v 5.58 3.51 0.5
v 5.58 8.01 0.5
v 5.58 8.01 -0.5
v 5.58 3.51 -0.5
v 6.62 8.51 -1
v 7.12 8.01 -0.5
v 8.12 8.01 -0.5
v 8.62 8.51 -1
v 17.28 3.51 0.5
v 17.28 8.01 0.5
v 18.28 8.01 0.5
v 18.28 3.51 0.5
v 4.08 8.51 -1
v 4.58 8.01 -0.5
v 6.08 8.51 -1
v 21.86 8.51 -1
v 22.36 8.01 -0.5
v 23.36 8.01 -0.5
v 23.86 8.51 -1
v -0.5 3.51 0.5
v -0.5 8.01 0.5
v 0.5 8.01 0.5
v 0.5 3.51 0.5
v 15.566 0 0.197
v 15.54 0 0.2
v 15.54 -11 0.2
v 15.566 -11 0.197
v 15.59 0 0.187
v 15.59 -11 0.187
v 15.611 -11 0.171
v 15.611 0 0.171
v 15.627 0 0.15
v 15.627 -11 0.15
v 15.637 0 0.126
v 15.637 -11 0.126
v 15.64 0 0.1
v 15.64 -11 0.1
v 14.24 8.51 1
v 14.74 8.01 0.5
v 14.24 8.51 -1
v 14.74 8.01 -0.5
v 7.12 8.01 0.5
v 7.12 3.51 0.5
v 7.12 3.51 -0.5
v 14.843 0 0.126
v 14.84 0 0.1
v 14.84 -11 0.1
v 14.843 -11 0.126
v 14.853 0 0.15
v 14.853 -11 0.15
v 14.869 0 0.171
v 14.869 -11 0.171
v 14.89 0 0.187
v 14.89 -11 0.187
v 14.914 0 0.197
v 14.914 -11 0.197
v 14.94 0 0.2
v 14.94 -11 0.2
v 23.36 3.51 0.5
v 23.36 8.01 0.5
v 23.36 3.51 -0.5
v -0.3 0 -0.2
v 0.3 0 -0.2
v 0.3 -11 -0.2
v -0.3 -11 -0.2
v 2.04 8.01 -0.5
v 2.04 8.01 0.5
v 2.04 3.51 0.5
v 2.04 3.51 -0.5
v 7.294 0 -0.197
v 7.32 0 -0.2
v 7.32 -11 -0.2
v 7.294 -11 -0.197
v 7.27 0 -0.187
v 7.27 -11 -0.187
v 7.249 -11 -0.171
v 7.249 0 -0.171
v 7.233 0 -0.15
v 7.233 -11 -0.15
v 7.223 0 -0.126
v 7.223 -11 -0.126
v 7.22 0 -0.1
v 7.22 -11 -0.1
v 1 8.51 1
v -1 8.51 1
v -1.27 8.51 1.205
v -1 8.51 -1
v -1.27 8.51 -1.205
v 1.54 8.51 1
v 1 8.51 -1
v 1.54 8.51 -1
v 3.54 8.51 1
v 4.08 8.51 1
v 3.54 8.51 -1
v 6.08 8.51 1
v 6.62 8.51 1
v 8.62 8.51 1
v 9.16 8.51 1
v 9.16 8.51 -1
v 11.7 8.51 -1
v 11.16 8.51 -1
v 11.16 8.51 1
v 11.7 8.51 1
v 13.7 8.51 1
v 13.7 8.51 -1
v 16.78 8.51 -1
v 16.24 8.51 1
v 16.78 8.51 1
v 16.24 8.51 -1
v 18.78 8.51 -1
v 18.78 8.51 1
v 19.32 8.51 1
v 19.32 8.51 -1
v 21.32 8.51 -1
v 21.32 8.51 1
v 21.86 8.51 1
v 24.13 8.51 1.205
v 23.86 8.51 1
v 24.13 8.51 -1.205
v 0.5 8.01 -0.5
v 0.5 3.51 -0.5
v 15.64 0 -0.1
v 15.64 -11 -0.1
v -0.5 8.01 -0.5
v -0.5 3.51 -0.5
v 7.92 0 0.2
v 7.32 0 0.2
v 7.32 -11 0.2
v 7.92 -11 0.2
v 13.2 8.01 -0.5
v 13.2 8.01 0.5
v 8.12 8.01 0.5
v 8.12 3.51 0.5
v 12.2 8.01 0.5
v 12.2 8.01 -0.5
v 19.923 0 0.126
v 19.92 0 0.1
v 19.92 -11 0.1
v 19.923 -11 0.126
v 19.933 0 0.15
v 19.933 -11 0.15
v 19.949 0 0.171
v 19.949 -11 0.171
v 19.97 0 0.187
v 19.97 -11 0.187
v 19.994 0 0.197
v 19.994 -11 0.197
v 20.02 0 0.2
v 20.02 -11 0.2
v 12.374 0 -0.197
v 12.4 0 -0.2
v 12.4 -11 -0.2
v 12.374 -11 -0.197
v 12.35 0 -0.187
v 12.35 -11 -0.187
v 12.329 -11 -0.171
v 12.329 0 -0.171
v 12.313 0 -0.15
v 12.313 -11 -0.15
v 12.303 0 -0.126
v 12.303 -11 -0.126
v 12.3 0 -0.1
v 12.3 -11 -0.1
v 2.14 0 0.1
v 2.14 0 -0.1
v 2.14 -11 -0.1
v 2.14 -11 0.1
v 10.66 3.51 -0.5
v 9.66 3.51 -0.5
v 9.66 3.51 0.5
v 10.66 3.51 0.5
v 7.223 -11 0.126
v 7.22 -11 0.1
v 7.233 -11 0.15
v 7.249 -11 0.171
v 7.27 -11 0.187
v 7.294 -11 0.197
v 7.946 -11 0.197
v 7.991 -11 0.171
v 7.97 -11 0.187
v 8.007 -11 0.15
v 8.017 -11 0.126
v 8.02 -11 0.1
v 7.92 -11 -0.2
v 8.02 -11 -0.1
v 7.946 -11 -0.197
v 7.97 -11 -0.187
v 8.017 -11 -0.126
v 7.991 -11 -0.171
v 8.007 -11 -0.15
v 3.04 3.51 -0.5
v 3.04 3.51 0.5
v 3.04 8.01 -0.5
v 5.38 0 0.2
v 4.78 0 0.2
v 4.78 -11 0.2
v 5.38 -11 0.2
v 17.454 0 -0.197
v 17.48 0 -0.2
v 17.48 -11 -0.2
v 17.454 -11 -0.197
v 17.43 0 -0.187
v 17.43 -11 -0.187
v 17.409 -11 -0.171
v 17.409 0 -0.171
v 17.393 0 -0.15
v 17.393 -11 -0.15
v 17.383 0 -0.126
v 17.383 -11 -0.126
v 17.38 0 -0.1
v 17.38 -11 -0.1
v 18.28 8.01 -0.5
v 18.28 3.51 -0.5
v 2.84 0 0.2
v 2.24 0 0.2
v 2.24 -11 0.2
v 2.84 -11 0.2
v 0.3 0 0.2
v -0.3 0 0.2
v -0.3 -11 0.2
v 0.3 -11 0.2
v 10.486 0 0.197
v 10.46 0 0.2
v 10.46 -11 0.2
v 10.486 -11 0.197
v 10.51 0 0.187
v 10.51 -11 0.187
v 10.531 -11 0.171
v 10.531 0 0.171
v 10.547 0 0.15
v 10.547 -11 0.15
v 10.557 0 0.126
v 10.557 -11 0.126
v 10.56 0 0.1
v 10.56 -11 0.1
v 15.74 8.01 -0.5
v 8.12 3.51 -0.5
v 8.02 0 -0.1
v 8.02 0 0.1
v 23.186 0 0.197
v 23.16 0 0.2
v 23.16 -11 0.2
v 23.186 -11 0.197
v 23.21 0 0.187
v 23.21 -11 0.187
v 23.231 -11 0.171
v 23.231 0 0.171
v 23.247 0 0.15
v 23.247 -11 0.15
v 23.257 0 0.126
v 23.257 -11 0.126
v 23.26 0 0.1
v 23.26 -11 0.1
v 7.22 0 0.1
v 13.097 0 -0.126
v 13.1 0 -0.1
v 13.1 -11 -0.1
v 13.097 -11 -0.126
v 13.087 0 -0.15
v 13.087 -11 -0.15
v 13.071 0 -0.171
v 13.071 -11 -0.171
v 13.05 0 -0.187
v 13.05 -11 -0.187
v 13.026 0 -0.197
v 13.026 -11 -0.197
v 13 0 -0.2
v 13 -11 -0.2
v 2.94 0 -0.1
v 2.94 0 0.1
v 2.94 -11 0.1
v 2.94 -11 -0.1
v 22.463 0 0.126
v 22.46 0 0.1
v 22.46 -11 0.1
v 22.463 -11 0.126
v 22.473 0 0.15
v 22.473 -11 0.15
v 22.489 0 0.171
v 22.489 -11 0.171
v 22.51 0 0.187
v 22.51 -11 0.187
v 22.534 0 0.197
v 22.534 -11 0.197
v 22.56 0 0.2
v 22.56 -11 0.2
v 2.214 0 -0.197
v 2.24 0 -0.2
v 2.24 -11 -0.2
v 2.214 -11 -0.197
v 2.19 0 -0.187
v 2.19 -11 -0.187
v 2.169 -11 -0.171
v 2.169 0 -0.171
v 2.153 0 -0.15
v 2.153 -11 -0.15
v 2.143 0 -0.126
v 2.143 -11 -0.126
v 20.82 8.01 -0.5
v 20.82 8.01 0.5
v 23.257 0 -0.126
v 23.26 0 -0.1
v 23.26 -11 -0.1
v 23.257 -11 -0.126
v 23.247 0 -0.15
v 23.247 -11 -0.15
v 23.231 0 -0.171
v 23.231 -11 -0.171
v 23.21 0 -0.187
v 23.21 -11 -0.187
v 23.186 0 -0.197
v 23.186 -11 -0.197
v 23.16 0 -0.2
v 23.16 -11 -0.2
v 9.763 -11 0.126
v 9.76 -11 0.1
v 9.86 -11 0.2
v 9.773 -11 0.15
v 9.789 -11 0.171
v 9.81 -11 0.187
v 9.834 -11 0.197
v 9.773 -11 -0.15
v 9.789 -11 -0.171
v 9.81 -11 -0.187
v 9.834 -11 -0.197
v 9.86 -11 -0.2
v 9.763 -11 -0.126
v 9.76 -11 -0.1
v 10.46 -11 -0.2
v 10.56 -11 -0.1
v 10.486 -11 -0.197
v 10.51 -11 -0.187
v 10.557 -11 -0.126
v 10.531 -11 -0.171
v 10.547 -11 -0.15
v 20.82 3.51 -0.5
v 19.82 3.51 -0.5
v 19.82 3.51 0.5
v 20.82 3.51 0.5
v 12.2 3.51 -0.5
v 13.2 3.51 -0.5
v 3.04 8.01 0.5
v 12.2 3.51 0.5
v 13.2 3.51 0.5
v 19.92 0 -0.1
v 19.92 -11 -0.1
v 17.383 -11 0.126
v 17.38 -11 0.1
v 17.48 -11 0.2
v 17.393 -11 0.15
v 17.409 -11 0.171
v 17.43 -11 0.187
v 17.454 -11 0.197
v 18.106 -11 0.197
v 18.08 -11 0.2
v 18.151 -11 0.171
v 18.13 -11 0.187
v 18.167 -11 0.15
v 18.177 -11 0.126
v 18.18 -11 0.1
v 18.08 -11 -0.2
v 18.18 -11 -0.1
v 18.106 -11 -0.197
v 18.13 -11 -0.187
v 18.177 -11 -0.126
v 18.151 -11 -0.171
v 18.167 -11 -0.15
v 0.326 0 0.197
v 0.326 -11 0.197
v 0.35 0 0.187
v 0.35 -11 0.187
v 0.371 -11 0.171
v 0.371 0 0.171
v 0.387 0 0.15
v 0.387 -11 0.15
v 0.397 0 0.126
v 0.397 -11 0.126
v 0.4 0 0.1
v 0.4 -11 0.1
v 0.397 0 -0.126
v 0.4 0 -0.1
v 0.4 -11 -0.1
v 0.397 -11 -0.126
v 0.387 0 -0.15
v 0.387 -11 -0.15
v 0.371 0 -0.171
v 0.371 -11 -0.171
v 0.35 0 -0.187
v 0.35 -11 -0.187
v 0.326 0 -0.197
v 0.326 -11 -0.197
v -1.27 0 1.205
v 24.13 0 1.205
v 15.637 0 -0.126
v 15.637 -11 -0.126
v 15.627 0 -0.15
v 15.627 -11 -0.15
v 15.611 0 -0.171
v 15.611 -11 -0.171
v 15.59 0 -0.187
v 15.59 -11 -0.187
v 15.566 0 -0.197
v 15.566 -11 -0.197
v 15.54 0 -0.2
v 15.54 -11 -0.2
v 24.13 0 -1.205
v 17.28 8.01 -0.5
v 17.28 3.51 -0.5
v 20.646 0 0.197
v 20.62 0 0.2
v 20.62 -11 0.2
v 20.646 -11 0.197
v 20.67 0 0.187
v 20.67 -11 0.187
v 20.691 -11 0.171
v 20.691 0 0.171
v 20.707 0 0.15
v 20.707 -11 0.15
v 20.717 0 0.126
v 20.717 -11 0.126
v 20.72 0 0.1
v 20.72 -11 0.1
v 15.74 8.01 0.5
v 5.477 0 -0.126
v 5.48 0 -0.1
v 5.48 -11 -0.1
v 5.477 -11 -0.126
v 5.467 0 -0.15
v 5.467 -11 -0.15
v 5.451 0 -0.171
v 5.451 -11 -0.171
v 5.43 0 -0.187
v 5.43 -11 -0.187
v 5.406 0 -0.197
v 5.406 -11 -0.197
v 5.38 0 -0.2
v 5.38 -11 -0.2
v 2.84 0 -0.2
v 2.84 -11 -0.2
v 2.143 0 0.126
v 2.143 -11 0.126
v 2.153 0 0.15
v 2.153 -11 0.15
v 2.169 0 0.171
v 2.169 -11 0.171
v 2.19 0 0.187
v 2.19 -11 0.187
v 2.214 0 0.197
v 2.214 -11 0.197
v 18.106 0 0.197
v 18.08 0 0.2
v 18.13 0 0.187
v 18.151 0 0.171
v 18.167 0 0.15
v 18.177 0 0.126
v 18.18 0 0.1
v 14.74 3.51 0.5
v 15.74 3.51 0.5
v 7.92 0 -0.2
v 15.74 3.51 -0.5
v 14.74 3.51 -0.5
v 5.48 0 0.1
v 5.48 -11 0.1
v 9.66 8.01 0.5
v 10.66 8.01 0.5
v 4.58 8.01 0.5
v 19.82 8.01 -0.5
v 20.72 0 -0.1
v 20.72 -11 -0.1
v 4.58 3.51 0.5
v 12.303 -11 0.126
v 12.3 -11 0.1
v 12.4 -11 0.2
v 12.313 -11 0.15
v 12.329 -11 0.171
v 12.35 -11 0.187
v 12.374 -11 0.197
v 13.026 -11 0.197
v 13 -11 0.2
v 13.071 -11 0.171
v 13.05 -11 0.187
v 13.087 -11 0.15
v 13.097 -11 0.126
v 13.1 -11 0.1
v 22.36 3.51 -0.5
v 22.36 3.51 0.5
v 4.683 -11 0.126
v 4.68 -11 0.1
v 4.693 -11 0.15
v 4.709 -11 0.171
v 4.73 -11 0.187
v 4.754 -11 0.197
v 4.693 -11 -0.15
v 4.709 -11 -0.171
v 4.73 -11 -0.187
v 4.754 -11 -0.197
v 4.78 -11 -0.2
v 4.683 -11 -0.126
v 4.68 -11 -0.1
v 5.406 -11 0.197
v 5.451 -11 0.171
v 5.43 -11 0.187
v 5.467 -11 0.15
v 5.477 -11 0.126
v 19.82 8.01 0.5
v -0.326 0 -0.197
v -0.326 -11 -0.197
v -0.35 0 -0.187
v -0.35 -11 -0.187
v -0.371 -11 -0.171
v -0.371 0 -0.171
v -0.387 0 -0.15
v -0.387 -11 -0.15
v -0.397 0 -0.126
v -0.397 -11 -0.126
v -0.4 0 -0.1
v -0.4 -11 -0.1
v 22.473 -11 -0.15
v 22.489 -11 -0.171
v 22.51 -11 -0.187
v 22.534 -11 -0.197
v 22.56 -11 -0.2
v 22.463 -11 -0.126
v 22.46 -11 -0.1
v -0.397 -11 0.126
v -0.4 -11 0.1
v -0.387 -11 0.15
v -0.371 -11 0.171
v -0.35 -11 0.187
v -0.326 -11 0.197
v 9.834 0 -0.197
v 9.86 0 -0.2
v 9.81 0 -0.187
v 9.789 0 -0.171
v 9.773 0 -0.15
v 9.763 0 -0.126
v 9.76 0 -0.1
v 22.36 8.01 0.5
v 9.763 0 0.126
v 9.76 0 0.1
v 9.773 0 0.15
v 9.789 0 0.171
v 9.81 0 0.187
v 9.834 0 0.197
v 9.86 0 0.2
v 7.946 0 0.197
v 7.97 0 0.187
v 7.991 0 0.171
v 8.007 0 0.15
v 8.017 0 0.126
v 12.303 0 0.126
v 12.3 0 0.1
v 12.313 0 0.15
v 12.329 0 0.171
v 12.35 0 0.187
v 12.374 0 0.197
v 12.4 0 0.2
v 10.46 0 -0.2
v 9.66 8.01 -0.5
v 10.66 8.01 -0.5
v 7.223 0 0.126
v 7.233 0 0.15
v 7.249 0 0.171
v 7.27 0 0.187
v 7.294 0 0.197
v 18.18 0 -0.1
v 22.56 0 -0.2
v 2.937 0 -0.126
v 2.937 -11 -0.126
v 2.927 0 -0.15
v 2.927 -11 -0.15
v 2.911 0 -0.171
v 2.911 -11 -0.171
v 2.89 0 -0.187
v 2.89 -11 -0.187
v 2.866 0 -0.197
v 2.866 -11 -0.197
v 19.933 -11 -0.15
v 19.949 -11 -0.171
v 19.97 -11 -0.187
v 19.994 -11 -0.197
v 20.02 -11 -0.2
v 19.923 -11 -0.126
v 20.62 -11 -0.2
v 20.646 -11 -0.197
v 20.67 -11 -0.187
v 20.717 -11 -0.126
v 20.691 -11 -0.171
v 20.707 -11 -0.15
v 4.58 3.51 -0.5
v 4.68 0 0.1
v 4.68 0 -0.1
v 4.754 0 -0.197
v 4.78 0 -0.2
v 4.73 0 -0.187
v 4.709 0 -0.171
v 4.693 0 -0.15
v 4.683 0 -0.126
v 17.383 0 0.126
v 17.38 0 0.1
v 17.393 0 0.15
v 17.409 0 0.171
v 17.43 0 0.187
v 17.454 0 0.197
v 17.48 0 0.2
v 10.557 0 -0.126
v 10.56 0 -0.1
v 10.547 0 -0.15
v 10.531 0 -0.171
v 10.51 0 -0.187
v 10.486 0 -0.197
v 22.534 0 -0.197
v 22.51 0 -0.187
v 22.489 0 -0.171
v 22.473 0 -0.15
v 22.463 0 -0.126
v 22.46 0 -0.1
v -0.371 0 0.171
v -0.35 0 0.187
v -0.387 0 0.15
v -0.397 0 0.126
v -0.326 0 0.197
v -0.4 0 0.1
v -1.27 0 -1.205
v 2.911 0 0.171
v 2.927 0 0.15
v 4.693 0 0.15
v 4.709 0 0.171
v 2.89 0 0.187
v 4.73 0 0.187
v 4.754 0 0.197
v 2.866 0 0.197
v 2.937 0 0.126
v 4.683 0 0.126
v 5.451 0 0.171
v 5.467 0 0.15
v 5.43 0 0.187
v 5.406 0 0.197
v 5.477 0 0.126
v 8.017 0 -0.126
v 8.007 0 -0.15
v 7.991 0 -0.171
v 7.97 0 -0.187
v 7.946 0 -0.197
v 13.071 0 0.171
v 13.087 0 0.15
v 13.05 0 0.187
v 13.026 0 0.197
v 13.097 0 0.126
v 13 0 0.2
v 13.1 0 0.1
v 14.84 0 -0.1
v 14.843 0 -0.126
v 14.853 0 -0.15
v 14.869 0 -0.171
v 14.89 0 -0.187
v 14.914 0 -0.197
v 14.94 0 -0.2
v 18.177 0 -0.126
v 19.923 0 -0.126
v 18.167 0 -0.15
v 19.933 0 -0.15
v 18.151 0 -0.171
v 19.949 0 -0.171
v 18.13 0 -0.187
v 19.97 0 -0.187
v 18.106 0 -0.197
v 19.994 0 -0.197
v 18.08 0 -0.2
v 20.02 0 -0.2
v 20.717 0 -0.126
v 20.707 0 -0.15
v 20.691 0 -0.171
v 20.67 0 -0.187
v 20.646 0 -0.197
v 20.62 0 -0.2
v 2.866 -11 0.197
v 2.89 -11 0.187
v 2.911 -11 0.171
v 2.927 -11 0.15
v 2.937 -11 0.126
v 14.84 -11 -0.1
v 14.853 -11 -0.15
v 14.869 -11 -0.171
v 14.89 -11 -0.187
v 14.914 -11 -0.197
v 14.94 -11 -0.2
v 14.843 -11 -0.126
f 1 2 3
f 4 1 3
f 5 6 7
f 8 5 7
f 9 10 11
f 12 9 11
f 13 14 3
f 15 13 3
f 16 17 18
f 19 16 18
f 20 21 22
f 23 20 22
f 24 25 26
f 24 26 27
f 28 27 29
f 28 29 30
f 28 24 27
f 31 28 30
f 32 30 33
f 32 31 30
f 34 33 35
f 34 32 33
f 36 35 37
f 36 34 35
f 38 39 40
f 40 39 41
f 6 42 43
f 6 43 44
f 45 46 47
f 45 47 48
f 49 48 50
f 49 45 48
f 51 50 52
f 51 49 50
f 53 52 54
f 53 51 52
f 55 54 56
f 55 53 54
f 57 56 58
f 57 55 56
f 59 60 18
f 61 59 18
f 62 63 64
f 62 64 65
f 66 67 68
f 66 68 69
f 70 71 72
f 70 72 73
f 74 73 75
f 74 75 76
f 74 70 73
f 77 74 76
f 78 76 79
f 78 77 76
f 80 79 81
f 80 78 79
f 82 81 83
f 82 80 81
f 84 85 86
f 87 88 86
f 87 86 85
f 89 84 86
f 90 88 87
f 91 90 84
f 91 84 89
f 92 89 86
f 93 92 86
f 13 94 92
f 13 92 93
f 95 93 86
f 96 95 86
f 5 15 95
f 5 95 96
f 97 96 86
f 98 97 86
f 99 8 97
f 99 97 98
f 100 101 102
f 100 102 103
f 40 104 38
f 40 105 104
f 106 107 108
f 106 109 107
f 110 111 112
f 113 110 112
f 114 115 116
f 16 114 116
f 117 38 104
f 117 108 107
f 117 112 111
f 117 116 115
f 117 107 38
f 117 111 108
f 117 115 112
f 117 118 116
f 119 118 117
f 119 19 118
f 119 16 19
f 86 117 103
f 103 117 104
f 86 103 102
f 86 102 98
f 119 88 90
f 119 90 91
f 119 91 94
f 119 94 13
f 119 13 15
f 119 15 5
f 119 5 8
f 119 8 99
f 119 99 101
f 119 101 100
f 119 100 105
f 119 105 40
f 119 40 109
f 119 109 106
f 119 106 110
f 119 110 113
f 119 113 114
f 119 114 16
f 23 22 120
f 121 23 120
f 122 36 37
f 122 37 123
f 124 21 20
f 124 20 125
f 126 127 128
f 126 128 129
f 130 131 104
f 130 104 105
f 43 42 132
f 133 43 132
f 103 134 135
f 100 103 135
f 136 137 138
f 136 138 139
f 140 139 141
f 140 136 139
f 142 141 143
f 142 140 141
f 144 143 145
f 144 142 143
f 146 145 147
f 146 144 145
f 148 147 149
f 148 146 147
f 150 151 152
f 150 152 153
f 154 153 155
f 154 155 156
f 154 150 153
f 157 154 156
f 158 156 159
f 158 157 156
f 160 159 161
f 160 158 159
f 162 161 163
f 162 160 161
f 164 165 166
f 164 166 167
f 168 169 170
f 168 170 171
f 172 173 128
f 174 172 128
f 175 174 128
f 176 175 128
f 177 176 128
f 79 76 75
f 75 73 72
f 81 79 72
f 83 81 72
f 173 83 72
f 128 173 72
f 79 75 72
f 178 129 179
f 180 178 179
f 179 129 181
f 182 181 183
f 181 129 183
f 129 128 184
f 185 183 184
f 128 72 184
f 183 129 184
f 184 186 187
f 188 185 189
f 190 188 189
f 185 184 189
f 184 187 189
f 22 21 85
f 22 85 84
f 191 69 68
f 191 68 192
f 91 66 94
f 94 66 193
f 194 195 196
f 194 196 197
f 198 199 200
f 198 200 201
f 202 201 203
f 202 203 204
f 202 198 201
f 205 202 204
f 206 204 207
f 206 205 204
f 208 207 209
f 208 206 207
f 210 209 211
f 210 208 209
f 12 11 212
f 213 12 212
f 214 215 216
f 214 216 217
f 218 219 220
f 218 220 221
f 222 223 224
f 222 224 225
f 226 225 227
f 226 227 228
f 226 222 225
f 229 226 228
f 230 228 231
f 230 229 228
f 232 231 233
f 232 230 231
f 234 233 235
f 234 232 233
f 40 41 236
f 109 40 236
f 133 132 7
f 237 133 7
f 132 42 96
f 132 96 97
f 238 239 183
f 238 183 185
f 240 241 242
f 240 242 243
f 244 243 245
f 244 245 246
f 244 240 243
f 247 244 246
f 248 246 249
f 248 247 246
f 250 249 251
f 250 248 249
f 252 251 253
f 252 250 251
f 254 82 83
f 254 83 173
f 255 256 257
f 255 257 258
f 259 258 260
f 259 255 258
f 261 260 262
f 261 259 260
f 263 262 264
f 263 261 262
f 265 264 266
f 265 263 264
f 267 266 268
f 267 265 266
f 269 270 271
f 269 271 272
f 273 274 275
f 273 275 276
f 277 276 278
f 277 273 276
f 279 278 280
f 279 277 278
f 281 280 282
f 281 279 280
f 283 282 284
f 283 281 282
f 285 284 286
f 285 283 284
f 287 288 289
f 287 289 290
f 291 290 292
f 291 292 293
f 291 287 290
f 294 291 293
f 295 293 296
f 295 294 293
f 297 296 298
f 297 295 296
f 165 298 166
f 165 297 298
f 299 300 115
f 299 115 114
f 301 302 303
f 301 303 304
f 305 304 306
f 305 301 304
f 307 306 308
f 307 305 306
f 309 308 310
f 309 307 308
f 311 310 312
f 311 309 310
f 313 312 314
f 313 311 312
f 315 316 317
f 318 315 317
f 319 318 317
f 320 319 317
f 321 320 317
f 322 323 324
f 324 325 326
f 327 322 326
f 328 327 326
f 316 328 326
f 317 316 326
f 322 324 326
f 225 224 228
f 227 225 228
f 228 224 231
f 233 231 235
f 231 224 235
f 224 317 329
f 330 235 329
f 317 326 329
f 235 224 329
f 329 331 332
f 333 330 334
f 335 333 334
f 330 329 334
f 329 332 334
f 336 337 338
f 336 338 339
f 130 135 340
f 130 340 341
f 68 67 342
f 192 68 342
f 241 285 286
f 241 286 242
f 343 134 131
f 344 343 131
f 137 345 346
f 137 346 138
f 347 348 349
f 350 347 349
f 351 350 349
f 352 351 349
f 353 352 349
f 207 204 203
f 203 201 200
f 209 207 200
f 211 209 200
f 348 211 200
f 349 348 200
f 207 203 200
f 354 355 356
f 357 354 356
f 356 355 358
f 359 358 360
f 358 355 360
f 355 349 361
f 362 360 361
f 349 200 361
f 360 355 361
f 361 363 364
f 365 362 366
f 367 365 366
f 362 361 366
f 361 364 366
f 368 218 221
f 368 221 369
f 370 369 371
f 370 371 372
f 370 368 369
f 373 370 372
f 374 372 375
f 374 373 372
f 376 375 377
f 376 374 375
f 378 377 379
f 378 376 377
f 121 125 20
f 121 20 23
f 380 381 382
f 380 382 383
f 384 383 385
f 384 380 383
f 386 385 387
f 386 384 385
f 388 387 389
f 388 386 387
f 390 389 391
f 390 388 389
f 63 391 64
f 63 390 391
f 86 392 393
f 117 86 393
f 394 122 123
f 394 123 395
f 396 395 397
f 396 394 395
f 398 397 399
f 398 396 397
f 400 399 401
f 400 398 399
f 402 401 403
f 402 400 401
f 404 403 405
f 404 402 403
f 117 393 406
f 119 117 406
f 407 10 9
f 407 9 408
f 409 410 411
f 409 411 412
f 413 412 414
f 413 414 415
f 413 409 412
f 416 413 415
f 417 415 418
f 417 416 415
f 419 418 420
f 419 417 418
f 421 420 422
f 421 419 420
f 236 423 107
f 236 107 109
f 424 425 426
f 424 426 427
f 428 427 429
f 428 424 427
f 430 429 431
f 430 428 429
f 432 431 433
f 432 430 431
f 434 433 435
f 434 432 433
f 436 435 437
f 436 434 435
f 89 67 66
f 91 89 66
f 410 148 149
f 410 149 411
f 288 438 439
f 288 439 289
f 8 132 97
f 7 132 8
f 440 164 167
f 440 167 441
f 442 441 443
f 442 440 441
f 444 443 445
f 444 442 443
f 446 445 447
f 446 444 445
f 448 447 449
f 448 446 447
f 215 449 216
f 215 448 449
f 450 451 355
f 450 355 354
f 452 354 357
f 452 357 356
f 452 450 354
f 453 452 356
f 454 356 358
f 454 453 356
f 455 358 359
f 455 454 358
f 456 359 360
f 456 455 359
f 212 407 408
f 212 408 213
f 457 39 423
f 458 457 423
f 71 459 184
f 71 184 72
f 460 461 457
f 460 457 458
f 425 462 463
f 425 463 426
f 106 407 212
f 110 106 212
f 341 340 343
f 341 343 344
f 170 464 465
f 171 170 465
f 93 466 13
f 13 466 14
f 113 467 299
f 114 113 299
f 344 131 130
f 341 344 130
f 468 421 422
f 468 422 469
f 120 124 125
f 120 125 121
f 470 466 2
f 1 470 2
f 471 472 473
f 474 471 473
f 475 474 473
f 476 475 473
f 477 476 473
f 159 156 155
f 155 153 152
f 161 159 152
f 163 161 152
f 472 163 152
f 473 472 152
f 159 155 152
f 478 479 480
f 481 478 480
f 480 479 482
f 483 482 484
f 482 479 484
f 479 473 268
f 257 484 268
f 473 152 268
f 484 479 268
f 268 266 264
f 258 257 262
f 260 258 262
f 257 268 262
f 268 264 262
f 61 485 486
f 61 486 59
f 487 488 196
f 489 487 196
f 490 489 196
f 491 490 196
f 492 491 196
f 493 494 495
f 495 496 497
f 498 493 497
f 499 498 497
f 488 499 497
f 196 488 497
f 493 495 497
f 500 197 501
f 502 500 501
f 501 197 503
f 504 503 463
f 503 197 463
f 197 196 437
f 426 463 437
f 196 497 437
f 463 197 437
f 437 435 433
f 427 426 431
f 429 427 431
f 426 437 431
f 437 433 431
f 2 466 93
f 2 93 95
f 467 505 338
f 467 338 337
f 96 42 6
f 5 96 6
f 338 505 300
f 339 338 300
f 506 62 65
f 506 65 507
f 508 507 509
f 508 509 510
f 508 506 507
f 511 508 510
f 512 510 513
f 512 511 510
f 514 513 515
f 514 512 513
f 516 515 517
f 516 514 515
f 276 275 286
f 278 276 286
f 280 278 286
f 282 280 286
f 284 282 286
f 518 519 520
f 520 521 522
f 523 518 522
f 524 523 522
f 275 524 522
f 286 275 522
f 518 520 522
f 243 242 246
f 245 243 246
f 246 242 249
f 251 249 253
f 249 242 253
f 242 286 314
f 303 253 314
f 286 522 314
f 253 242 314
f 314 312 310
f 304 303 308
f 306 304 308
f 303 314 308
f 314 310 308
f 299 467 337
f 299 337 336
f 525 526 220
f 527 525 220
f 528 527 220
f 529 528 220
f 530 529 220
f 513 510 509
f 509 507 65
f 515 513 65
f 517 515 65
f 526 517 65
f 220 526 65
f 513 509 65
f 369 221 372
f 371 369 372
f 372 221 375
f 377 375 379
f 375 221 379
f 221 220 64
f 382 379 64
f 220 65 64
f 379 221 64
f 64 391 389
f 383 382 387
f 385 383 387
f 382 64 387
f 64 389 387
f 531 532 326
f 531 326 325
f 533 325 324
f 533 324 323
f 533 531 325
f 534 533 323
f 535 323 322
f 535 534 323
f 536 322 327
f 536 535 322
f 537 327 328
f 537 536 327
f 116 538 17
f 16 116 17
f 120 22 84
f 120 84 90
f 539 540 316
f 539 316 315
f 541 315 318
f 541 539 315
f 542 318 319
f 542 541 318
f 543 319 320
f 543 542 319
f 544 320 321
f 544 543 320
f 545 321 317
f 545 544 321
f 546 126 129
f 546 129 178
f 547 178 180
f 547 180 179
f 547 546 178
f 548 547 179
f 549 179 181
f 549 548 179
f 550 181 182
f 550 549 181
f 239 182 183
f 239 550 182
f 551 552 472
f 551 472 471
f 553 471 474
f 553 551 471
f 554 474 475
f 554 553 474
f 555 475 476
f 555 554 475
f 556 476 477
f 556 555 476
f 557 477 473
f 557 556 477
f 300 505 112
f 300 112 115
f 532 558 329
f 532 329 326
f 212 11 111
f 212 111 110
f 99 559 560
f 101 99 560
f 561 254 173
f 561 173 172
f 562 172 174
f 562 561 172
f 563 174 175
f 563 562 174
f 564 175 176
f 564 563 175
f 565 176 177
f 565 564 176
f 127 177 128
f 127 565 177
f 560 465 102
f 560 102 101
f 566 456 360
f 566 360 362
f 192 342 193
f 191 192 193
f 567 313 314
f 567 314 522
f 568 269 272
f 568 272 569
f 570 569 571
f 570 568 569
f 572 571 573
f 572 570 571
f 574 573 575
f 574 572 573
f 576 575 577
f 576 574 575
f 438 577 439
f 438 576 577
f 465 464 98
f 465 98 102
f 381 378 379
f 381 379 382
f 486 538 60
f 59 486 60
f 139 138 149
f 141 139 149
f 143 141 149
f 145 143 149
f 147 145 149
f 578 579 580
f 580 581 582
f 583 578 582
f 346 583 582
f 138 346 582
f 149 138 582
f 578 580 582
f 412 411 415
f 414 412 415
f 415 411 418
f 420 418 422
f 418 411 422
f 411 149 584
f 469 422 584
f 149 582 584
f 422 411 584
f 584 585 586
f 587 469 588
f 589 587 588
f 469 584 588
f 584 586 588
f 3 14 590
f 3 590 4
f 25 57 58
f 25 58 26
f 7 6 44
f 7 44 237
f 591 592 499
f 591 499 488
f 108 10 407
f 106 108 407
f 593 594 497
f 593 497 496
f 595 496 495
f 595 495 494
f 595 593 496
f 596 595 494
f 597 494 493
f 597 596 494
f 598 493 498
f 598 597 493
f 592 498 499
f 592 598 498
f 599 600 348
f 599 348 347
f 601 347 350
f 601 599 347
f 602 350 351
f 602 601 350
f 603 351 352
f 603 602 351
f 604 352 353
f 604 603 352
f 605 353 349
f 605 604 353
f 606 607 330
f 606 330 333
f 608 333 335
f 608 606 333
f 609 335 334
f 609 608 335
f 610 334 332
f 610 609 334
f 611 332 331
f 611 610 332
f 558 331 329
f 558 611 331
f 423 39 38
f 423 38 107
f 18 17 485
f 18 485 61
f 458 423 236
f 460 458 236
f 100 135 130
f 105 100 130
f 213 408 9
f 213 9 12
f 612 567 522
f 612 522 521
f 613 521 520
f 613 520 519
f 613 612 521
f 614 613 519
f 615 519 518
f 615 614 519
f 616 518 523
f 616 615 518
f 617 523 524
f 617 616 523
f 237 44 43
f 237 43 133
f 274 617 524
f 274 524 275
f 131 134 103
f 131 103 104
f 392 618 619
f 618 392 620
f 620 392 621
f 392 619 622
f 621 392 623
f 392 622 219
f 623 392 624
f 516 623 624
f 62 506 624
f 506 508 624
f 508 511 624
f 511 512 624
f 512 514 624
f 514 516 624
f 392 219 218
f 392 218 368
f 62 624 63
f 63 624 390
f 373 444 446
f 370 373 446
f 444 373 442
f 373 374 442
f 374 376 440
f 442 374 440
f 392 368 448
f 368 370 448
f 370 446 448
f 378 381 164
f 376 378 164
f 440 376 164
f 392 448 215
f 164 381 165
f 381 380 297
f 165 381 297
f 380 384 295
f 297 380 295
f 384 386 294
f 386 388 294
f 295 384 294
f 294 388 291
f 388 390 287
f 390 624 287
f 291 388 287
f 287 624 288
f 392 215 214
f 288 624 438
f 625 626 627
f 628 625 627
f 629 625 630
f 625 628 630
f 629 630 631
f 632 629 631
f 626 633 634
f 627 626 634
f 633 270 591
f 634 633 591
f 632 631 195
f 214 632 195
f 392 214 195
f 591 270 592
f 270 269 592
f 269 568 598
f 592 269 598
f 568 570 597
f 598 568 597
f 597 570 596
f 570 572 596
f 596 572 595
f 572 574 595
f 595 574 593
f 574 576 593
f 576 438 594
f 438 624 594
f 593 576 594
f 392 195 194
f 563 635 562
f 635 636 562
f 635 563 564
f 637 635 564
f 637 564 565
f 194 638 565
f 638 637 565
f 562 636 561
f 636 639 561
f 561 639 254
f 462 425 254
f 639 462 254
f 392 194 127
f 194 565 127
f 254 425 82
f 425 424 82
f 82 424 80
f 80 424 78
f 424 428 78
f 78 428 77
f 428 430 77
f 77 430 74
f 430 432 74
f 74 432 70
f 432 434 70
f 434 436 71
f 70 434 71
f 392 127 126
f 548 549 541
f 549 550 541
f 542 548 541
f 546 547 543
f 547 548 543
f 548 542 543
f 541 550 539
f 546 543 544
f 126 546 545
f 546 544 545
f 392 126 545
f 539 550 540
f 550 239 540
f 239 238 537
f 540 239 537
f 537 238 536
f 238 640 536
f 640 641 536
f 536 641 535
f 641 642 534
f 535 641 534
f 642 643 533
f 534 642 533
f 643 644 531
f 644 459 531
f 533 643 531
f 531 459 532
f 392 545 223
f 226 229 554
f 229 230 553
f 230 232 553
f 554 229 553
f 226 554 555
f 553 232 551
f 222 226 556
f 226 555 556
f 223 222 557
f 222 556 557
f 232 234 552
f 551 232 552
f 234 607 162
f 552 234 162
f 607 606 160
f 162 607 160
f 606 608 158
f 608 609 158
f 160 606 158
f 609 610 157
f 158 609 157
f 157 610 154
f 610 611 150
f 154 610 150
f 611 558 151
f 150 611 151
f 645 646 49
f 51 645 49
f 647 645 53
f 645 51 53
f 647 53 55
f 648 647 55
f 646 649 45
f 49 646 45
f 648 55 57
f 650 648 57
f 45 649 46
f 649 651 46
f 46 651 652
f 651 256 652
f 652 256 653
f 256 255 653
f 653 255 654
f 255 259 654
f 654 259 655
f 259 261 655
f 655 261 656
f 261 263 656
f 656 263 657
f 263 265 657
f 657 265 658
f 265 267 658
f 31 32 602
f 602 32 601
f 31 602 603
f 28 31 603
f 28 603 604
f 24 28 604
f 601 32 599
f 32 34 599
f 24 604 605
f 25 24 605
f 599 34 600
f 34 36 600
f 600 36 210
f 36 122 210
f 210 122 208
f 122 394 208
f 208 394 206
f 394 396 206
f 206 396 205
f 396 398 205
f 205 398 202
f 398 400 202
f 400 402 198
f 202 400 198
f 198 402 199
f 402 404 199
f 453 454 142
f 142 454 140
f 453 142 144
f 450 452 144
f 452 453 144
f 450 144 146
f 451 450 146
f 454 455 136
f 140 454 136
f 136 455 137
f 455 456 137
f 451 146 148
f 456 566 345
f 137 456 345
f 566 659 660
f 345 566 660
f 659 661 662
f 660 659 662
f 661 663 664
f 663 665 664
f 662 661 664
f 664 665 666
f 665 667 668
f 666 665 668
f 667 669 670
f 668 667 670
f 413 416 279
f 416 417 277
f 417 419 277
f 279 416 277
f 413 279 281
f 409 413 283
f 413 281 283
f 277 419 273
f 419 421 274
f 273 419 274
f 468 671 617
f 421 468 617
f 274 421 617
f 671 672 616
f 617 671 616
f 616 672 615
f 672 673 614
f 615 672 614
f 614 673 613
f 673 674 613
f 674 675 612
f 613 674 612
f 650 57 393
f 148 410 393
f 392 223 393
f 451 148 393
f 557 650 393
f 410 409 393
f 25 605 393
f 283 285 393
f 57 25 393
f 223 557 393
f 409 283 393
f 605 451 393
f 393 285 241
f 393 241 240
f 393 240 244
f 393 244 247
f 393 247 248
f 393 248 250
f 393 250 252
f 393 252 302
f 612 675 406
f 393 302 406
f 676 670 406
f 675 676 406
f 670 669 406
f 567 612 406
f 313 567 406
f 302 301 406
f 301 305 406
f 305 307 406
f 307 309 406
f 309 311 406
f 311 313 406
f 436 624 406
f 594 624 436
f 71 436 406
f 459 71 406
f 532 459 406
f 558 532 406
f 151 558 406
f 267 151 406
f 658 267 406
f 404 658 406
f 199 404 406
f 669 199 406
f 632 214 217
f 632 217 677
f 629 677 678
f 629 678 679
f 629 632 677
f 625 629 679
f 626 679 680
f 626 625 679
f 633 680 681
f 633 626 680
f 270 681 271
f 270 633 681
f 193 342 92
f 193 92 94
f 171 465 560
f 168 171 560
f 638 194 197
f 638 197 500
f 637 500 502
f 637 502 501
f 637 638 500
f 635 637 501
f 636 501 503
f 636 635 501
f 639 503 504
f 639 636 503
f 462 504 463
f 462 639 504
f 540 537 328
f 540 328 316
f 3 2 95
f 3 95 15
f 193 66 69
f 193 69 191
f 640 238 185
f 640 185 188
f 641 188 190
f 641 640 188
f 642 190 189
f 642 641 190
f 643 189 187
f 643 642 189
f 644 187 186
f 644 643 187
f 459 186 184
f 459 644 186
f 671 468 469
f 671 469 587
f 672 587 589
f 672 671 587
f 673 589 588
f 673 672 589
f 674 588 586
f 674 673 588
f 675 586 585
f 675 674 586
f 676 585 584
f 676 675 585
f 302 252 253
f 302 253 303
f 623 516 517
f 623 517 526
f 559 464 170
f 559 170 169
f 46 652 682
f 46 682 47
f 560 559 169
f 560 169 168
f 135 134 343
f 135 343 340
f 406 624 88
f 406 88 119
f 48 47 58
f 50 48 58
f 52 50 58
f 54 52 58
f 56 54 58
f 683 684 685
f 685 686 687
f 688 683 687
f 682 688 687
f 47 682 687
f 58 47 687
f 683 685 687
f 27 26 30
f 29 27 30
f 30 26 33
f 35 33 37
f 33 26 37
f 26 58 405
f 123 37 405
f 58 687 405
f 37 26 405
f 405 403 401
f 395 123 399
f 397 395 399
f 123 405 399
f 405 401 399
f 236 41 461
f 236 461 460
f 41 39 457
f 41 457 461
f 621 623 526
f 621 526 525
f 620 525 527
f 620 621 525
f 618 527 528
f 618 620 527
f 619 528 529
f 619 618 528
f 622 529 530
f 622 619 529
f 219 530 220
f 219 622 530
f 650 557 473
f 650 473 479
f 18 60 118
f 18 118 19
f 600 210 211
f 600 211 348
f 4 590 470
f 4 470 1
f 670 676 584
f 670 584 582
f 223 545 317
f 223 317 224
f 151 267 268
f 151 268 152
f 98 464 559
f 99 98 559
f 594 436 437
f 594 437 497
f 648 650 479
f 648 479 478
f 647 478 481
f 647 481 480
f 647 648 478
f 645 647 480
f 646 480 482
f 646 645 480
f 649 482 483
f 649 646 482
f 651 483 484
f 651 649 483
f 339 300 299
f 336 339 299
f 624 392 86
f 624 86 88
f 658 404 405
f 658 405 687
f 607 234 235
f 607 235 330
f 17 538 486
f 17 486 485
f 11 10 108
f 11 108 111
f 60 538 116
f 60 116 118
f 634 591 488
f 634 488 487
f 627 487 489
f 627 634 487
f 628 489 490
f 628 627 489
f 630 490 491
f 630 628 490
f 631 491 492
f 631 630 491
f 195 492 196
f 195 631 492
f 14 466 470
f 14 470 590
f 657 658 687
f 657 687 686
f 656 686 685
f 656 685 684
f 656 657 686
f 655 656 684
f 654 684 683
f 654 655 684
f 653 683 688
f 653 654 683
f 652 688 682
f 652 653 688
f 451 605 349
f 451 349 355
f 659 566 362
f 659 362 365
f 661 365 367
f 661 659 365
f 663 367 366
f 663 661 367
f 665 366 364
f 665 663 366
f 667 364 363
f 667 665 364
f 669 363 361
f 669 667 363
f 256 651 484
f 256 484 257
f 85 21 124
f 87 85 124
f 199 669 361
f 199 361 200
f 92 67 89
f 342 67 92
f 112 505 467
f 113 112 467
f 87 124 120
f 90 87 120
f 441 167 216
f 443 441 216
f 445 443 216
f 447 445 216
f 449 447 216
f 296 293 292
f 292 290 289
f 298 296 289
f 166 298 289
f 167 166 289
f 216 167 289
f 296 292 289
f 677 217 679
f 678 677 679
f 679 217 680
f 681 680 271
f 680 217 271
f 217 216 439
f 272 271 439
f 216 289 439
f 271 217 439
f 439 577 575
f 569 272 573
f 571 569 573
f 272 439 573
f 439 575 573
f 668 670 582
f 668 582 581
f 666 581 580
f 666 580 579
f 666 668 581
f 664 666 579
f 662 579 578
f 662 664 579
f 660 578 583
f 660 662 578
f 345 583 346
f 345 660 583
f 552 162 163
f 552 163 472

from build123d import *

# Parameters (mm, degrees)
SKETCH2_W                  = 25.4
SKETCH2_H                  = 2.41
BOSS_EXTRUDE1_DEPTH        = 8.51
SKETCH5_W                  = 1
SKETCH5_H                  = 1
CUT_EXTRUDE1_DEPTH         = 5
CHAMFER1_SIZE              = 0.5
LPATTERN3_COUNT            = 10
LPATTERN3_PITCH            = 2.54
CHAMFER1_OF_LPATTERN3_SIZE = 0.5
BOSS_EXTRUDE2_DEPTH        = 11
LPATTERN1_COUNT            = 10
LPATTERN1_PITCH            = 2.54


with BuildPart() as part:
    # Sketch2 → Boss-Extrude1 (new body)
    with BuildSketch(Plane(origin=(0, 0, 0), x_dir=(1, 0, 0), z_dir=(0, 1, 0))):
        with Locations((11.43, 0)):
            Rectangle(SKETCH2_W, SKETCH2_H)
    extrude(amount=BOSS_EXTRUDE1_DEPTH)

    # Sketch5 → Cut-Extrude1 (cut)
    with BuildSketch(Plane(origin=(0, 8.51, 0), x_dir=(1, 0, 0), z_dir=(0, 1, 0))):
        Rectangle(SKETCH5_W, SKETCH5_H)
    cut_extrude1 = extrude(amount=-CUT_EXTRUDE1_DEPTH, mode=Mode.SUBTRACT)

    # Chamfer1
    chamfer1_edges = [part.edges().sort_by_distance(p)[0] for p in [
        (0.5, 8.51, 0),
        (0, 8.51, -0.5),
        (-0.5, 8.51, 0),
        (0, 8.51, 0.5),
    ]]
    chamfer(chamfer1_edges, length=CHAMFER1_SIZE)

    # LPattern3: Cut-Extrude1 ×10
    with Locations(*[(i * LPATTERN3_PITCH, 0, 0) for i in range(1, LPATTERN3_COUNT)]):
        add(cut_extrude1, mode=Mode.SUBTRACT)

    # Chamfer1 of LPattern3
    chamfer1_of_lpattern3_edges = [part.edges().sort_by_distance(p)[0] for p in [
        (3.04, 8.51, 0),
        (2.54, 8.51, -0.5),
        (2.04, 8.51, 0),
        (2.54, 8.51, 0.5),
        (5.58, 8.51, 0),
        (5.08, 8.51, -0.5),
        (4.58, 8.51, 0),
        (5.08, 8.51, 0.5),
        (8.12, 8.51, 0),
        (7.62, 8.51, -0.5),
        (7.12, 8.51, 0),
        (7.62, 8.51, 0.5),
        (10.66, 8.51, 0),
        (10.16, 8.51, -0.5),
        (9.66, 8.51, 0),
        (10.16, 8.51, 0.5),
        (13.2, 8.51, 0),
        (12.7, 8.51, -0.5),
        (12.2, 8.51, 0),
        (12.7, 8.51, 0.5),
        (15.74, 8.51, 0),
        (15.24, 8.51, -0.5),
        (14.74, 8.51, 0),
        (15.24, 8.51, 0.5),
        (18.28, 8.51, 0),
        (17.78, 8.51, -0.5),
        (17.28, 8.51, 0),
        (17.78, 8.51, 0.5),
        (20.82, 8.51, 0),
        (20.32, 8.51, -0.5),
        (19.82, 8.51, 0),
        (20.32, 8.51, 0.5),
        (23.36, 8.51, 0),
        (22.86, 8.51, -0.5),
        (22.36, 8.51, 0),
        (22.86, 8.51, 0.5),
    ]]
    chamfer(chamfer1_of_lpattern3_edges, length=CHAMFER1_OF_LPATTERN3_SIZE)

    # Sketch8 → Boss-Extrude2 (add)
    with BuildSketch(Plane(origin=(0, 0, 0), x_dir=(1, 0, 0), z_dir=(0, 1, 0))):
        with BuildLine():
            Line((-0.3, -0.2), (0.3, -0.2))
            ThreePointArc((0.3, -0.2), (0.370710678, -0.170710678), (0.4, -0.1))
            Line((0.4, -0.1), (0.4, 0.1))
            ThreePointArc((0.4, 0.1), (0.370710678, 0.170710678), (0.3, 0.2))
            Line((0.3, 0.2), (-0.3, 0.2))
            ThreePointArc((-0.3, 0.2), (-0.370710678, 0.170710678), (-0.4, 0.1))
            Line((-0.4, 0.1), (-0.4, -0.1))
            ThreePointArc((-0.4, -0.1), (-0.370710678, -0.170710678), (-0.3, -0.2))
        make_face()
    boss_extrude2 = extrude(amount=-BOSS_EXTRUDE2_DEPTH)

    # LPattern1: Boss-Extrude2 ×10
    with Locations(*[(i * LPATTERN1_PITCH, 0, 0) for i in range(1, LPATTERN1_COUNT)]):
        add(boss_extrude2)


solid = part.part
